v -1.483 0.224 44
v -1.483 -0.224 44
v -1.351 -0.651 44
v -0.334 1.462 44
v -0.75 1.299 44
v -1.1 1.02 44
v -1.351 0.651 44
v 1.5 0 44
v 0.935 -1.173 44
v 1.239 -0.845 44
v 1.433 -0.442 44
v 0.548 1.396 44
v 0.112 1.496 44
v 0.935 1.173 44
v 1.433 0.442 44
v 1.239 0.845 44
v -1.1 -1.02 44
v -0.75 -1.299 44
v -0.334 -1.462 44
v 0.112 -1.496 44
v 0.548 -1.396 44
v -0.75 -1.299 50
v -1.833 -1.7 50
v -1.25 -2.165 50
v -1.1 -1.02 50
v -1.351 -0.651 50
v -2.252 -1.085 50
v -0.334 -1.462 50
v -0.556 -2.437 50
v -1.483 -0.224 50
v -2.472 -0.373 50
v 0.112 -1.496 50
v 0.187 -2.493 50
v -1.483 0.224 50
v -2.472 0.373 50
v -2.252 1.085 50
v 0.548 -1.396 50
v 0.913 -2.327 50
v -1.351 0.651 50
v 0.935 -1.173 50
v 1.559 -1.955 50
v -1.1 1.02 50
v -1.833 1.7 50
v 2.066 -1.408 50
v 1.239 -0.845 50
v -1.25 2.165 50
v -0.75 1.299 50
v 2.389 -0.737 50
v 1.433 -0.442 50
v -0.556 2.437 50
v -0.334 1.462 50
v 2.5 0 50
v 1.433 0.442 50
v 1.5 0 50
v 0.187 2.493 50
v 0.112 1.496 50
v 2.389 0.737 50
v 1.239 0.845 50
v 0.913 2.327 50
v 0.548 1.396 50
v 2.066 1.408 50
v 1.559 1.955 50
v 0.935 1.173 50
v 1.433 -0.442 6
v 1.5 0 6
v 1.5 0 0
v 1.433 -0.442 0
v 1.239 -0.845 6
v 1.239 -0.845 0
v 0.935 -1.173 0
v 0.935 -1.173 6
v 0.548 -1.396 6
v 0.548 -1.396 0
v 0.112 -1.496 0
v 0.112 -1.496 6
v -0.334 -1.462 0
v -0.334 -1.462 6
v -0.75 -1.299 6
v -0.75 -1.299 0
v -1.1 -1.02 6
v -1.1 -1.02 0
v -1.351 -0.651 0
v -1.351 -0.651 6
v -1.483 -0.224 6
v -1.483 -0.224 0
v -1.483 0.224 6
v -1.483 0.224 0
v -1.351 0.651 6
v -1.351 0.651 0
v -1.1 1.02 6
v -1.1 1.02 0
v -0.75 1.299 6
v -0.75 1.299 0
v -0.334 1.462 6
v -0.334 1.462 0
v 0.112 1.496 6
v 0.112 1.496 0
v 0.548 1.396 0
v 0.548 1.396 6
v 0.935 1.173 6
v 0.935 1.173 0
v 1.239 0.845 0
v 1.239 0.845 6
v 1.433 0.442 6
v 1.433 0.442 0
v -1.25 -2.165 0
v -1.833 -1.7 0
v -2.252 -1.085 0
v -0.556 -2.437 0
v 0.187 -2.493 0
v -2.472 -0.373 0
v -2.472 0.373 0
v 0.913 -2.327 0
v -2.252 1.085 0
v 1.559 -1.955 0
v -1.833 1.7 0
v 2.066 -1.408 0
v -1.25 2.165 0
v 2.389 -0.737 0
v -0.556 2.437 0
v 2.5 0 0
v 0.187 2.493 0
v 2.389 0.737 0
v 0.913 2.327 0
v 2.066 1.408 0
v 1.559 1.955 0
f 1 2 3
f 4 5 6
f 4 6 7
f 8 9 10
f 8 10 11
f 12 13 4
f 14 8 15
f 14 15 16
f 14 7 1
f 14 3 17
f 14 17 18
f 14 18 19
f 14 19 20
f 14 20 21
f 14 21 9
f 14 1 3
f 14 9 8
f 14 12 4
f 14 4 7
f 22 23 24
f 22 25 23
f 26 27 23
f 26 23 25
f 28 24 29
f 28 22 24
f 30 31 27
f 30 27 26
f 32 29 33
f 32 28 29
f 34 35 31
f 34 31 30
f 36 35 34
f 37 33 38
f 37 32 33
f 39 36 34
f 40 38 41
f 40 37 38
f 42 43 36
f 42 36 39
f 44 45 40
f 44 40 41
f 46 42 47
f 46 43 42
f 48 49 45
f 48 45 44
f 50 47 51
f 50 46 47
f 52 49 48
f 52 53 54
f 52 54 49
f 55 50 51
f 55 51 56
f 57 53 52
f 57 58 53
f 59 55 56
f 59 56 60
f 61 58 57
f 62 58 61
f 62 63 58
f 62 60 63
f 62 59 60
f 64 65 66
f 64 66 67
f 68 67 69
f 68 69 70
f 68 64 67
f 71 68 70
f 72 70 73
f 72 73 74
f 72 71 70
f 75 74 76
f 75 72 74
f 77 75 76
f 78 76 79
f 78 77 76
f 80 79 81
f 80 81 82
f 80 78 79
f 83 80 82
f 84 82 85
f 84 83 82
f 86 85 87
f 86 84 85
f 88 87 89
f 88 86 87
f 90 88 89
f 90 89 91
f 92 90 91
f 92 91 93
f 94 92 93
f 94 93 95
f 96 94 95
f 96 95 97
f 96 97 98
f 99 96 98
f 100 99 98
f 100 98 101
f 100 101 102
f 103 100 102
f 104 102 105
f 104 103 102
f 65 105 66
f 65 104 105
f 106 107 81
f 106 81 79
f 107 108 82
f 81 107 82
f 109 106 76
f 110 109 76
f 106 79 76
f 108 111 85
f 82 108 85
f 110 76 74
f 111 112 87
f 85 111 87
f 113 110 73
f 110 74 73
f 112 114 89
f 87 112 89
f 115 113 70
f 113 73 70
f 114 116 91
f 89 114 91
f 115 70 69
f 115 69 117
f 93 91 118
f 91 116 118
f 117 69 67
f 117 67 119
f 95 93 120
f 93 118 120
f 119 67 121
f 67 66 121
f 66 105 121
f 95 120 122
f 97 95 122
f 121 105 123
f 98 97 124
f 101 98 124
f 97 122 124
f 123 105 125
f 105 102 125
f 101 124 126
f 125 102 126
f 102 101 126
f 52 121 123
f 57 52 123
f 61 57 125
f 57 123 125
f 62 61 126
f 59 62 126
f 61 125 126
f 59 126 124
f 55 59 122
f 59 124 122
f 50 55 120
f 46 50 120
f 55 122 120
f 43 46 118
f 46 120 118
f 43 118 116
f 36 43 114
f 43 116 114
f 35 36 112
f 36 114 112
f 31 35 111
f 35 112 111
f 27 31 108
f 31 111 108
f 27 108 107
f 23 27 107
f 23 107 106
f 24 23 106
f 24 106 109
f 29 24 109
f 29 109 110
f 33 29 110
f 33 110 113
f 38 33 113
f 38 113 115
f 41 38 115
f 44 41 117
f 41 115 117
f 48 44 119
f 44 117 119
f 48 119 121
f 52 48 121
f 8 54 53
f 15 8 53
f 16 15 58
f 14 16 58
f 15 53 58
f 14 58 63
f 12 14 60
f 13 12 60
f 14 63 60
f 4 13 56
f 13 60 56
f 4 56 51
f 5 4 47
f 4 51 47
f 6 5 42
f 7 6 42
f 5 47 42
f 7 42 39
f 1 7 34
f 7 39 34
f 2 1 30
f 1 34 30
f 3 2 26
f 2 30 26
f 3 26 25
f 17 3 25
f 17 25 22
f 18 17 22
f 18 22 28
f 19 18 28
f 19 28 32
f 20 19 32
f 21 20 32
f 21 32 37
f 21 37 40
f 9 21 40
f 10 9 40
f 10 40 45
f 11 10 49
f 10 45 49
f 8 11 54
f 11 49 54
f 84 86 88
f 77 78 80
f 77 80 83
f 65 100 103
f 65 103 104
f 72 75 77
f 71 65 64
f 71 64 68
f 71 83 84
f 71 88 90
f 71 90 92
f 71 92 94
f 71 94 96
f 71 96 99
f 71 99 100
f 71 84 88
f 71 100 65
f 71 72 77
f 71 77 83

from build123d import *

# Parameters (mm, degrees)
SKETCH1_R           = 2.5
BOSS_EXTRUDE2_DEPTH = 50
SKETCH2_R           = 1.5
CUT_EXTRUDE1_DEPTH  = 6
CUT_EXTRUDE2_START  = -6
SKETCH3_R           = 1.5
CUT_EXTRUDE2_DEPTH  = 6


with BuildPart() as part:
    # Sketch1 → Boss-Extrude2 (new body)
    with BuildSketch(Plane.XY):
        Circle(SKETCH1_R)
    extrude(amount=BOSS_EXTRUDE2_DEPTH)

    # Sketch2 → Cut-Extrude1 (cut)
    with BuildSketch(Plane.XY.offset(50)):
        Circle(SKETCH2_R)
    extrude(amount=-CUT_EXTRUDE1_DEPTH, mode=Mode.SUBTRACT)

    # Sketch3 → Cut-Extrude2 (cut)
    with BuildSketch(Plane(origin=(0, 0, 0), x_dir=(-1, 0, 0), z_dir=(0, 0, -1)).offset(CUT_EXTRUDE2_START)):
        with Locations(Location((0, 0, 0), (0, 0, 180))):
            Circle(SKETCH3_R)
    extrude(amount=CUT_EXTRUDE2_DEPTH, mode=Mode.SUBTRACT)


solid = part.part
